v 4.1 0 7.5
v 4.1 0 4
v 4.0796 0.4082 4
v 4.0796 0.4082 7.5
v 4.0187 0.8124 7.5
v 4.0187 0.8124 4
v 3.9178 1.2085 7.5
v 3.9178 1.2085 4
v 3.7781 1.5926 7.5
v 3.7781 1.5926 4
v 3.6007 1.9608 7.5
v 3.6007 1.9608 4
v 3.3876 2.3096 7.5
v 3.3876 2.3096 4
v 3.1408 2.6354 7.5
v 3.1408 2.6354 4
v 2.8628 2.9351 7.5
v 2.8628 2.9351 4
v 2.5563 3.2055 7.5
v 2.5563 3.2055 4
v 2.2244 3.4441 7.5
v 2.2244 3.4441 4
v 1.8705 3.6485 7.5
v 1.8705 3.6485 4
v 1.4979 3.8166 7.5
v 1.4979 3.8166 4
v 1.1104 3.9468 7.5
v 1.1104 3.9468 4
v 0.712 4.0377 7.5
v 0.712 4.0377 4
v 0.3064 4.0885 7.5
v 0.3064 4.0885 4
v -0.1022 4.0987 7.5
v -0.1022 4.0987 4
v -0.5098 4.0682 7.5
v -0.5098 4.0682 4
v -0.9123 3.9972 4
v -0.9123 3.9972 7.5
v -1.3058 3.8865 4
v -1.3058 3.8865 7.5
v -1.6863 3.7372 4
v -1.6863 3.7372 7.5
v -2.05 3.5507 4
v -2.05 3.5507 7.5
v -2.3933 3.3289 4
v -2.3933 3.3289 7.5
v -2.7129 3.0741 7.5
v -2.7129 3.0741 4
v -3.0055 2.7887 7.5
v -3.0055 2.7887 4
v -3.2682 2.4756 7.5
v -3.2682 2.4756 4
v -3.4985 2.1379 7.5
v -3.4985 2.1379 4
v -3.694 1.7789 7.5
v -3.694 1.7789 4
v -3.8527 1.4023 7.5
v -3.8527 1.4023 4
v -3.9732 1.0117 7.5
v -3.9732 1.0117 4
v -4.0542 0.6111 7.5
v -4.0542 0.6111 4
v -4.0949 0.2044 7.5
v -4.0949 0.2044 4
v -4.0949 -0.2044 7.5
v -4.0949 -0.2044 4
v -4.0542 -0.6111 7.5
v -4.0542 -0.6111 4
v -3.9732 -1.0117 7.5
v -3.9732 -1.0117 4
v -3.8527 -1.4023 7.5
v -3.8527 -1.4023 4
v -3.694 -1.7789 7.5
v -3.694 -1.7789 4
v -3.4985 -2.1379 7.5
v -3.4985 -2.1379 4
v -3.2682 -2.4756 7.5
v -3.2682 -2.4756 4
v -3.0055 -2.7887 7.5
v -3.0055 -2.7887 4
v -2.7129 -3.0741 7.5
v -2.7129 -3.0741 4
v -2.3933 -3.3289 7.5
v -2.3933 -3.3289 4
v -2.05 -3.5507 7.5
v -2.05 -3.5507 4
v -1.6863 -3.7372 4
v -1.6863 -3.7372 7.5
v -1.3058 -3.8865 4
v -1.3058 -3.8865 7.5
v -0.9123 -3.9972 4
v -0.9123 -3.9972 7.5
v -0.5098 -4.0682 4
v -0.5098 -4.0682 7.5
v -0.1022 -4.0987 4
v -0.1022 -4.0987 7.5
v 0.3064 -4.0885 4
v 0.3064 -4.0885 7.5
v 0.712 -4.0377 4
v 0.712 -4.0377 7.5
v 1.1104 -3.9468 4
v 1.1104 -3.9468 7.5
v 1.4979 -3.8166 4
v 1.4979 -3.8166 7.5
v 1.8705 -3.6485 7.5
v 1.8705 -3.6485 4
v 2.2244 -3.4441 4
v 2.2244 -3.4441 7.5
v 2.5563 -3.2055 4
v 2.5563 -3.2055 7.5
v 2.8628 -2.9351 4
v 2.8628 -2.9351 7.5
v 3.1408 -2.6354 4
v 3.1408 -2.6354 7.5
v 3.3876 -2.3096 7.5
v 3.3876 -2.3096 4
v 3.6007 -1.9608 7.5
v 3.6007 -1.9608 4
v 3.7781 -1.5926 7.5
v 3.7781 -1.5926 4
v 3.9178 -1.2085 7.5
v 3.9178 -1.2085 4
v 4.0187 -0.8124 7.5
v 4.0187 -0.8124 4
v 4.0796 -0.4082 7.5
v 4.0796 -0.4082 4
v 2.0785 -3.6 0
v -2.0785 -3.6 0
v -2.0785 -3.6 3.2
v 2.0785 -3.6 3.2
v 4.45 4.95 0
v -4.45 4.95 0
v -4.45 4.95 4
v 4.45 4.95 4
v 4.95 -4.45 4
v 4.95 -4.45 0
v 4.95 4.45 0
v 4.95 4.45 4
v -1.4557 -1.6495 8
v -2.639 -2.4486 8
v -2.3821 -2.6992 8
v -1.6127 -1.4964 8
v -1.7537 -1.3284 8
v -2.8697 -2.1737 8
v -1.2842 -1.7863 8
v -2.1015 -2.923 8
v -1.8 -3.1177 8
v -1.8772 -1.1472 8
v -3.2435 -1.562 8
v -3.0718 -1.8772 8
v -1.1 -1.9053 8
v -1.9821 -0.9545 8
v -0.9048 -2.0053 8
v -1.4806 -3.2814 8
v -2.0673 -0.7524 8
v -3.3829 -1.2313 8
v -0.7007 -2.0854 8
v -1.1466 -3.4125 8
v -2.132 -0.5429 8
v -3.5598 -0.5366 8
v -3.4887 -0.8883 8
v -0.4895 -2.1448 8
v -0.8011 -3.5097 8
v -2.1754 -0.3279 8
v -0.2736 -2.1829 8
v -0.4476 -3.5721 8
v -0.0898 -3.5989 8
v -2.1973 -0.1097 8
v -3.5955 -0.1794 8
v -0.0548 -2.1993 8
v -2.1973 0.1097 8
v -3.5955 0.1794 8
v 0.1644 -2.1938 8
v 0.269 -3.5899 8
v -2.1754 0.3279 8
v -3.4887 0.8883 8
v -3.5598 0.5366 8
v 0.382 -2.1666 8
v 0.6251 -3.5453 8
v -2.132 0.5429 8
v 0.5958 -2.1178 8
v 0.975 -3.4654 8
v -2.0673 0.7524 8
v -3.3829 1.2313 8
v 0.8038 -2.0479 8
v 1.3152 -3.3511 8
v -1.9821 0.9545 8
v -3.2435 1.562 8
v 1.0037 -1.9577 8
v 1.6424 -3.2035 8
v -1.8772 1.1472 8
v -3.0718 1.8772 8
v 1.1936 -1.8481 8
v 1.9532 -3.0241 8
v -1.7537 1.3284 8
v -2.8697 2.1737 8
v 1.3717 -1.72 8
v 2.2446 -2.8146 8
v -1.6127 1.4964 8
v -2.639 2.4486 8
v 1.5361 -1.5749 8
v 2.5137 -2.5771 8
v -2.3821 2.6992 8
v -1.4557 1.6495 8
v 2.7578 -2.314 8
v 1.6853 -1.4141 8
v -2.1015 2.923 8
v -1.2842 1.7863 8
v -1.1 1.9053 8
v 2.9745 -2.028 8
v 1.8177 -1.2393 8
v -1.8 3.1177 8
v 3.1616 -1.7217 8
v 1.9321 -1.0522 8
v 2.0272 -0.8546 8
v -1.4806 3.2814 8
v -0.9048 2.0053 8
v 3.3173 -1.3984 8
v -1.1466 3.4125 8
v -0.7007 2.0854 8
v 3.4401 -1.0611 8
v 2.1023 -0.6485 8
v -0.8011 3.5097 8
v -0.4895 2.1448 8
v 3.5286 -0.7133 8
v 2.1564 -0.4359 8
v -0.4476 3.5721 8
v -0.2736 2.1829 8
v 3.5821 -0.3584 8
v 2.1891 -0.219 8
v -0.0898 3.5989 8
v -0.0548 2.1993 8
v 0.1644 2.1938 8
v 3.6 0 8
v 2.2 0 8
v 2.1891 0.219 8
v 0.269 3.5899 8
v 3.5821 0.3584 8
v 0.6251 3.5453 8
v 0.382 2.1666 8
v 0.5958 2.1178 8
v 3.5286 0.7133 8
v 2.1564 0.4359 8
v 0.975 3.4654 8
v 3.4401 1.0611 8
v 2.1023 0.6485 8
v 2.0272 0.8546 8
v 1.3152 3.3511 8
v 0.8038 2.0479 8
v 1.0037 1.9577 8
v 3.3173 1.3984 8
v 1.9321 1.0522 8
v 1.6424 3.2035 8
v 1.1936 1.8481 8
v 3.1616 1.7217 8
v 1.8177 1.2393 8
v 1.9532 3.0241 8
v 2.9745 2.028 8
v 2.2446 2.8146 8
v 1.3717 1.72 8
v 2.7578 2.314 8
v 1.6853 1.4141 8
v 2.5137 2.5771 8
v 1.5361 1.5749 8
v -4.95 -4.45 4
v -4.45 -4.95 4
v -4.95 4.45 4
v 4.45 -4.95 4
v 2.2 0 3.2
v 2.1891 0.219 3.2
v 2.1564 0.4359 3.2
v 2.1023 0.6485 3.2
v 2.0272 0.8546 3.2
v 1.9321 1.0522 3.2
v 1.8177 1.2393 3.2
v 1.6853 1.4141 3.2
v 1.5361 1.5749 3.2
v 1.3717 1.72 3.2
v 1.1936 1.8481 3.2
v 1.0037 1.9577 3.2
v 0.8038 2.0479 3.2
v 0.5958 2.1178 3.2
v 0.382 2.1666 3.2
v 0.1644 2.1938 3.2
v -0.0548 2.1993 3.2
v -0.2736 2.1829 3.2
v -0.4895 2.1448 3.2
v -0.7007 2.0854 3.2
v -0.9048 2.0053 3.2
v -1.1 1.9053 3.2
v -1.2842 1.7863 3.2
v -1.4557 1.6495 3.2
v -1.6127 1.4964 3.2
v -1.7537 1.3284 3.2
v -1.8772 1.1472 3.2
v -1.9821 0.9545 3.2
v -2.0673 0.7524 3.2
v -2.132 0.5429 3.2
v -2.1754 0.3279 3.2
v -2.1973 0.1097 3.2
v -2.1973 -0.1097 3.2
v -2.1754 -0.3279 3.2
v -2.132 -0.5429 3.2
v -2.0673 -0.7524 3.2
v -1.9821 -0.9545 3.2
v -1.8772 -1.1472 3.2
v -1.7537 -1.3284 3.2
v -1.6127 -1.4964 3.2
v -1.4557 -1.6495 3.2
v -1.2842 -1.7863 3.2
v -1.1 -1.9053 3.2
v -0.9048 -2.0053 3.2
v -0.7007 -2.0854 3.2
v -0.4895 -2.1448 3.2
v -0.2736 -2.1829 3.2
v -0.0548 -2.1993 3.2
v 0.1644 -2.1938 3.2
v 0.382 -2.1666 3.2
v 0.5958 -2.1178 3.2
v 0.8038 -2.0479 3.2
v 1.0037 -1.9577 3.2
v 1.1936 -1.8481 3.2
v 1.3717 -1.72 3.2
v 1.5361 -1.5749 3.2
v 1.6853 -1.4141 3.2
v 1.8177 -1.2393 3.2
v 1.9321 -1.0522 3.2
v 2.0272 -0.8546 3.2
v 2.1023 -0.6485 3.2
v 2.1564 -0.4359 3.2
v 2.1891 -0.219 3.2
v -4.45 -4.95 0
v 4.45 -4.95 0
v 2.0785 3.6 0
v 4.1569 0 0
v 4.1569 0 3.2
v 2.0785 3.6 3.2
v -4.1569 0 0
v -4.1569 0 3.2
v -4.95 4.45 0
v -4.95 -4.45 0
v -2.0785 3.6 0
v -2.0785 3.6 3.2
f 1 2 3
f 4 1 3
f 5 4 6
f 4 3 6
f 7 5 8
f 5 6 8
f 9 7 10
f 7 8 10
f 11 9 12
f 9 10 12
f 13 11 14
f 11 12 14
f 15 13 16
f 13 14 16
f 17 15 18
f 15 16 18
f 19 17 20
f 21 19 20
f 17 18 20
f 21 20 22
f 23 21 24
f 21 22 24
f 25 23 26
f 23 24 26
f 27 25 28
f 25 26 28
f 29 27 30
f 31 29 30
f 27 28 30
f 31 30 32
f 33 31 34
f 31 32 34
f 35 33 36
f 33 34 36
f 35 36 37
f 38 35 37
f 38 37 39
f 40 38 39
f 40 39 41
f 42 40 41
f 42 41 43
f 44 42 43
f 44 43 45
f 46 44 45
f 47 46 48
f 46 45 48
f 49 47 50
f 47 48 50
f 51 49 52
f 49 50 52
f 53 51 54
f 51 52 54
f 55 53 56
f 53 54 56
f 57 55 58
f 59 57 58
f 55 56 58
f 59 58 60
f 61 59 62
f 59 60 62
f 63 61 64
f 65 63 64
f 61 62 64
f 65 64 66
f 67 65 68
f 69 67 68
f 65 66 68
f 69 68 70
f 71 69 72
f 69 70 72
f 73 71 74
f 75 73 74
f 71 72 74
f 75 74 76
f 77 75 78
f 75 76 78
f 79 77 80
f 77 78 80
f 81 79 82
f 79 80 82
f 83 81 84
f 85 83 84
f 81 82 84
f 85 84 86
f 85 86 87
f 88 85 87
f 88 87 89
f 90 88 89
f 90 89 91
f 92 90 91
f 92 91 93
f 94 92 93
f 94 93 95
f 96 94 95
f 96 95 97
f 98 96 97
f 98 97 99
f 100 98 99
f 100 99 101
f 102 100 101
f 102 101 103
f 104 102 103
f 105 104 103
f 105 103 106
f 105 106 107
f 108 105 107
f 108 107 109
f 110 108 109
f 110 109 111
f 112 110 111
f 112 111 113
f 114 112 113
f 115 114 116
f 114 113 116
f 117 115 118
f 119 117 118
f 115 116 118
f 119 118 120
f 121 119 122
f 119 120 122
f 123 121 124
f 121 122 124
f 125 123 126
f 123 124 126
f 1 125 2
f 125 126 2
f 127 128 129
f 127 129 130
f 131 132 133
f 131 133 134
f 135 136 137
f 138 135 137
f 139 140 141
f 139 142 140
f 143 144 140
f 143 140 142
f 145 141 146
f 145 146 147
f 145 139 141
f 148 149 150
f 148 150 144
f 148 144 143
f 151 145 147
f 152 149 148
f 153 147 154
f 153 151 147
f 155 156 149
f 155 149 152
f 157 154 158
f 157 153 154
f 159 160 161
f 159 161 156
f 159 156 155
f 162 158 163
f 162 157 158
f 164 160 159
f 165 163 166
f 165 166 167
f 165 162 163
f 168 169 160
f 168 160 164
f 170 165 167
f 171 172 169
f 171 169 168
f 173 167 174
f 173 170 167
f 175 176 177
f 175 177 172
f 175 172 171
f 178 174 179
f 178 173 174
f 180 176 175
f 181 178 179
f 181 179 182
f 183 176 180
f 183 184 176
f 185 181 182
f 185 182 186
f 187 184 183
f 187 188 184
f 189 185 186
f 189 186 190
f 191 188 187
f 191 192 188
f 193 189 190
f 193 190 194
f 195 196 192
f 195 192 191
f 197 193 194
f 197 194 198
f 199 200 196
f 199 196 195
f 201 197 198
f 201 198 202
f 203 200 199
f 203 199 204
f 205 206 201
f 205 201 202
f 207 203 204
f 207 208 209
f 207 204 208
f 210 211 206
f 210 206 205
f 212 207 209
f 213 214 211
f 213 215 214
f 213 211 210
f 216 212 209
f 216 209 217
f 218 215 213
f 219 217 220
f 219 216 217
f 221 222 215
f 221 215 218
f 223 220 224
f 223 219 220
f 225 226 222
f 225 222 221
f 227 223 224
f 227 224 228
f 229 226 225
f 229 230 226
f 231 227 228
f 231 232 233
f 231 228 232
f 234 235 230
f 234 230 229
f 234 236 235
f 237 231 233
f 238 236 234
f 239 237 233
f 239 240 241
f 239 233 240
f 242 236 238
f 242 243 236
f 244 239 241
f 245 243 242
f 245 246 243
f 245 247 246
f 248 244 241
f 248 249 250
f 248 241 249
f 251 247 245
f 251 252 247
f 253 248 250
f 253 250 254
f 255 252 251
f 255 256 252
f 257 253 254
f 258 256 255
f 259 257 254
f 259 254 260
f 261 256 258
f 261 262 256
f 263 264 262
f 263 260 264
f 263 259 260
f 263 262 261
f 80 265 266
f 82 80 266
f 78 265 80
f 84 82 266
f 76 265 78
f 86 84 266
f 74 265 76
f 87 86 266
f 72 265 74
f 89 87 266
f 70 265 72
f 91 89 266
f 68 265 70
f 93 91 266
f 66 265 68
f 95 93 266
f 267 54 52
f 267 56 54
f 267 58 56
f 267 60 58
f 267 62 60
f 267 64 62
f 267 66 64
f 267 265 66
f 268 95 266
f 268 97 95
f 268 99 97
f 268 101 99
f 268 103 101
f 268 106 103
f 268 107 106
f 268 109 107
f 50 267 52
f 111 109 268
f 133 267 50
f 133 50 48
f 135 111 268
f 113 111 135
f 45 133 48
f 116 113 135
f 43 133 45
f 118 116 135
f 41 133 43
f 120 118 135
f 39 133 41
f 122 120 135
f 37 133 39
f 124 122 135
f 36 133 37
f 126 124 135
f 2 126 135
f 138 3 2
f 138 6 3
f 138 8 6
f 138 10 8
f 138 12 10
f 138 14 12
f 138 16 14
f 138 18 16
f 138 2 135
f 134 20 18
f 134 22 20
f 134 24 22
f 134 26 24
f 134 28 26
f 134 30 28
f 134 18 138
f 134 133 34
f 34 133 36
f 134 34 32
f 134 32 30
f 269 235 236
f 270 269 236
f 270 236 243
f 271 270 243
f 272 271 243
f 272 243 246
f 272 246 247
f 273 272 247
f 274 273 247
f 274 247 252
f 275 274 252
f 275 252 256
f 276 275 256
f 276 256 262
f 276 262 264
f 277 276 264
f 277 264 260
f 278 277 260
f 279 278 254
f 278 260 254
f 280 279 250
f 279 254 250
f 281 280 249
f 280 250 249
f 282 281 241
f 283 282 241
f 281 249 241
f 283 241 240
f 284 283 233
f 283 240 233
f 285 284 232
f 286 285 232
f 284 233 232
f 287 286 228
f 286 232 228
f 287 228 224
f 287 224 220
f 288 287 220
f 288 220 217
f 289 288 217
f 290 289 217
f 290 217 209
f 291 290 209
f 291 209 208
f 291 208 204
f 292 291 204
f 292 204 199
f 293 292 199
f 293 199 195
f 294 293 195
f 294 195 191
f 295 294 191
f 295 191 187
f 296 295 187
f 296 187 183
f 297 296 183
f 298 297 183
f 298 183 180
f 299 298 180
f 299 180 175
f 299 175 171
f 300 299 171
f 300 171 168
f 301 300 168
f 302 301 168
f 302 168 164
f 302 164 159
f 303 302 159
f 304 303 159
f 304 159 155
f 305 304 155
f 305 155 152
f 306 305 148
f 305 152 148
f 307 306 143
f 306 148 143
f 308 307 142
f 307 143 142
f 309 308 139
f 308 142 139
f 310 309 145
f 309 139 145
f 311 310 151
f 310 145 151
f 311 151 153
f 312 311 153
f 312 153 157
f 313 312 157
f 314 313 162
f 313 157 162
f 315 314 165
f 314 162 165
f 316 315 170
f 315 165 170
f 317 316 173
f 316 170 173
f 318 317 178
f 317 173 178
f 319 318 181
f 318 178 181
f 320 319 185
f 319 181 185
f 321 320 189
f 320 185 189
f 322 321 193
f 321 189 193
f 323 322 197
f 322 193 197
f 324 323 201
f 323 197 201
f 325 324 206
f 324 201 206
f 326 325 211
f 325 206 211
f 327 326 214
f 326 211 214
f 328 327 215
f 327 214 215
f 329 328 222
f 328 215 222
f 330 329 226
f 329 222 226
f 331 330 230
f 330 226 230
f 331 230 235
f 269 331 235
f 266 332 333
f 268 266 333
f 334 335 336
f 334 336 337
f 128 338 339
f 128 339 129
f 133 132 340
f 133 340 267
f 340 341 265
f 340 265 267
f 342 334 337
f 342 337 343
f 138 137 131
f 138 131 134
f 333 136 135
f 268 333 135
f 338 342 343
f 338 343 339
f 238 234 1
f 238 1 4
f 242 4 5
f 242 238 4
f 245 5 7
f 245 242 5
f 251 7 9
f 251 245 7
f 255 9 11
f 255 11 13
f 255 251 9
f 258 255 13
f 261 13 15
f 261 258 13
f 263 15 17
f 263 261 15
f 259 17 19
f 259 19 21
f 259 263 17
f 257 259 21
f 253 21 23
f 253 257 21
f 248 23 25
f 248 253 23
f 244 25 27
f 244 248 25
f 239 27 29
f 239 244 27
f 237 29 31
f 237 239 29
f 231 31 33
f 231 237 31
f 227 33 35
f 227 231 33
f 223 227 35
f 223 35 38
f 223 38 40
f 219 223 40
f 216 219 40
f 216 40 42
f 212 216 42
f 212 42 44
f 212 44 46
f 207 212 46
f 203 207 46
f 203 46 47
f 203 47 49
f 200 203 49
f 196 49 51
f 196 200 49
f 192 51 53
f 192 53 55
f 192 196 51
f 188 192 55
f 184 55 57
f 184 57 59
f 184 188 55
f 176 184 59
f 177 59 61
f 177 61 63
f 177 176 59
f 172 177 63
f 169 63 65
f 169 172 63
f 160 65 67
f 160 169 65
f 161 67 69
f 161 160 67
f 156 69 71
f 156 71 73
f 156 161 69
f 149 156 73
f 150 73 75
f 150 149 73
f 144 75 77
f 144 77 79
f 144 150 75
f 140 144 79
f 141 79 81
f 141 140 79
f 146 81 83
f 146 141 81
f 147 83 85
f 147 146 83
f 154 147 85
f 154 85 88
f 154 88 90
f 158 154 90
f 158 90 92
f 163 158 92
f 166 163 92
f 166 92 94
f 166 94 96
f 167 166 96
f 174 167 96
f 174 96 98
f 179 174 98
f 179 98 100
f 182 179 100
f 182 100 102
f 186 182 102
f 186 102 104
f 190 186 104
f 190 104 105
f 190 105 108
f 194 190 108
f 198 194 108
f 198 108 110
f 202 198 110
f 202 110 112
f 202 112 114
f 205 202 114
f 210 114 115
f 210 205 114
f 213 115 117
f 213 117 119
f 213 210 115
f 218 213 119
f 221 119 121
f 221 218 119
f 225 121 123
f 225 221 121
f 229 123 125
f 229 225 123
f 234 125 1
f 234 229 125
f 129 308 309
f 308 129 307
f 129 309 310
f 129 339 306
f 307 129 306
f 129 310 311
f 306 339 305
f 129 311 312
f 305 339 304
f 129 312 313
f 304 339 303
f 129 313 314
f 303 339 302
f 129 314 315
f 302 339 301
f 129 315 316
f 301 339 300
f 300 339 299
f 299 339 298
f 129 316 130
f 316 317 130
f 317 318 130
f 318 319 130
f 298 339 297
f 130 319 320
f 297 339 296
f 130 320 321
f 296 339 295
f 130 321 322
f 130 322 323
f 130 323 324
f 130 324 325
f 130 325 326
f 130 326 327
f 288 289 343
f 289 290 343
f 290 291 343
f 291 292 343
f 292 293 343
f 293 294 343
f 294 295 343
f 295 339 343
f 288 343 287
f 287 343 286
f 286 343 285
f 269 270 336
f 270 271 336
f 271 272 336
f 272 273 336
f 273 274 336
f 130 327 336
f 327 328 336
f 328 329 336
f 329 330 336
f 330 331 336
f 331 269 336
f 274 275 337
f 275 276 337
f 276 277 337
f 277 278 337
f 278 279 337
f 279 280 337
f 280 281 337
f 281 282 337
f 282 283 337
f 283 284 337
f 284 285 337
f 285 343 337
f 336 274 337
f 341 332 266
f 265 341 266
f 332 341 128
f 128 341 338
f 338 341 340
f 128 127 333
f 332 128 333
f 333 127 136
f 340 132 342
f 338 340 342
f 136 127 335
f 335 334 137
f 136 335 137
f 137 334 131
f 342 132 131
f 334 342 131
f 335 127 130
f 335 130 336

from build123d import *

# Parameters (mm, degrees)
ESQUISSE1_W             = 9.9
ESQUISSE1_H             = 9.9
BOSS_EXTRU_1_DEPTH      = 4
ENL_V_MAT_EXTRU_1_DEPTH = 3.2
ESQUISSE4_R             = 4.1
BOSS_EXTRU_2_DEPTH      = 4
CHANFREIN1_SIZE         = 0.5
ESQUISSE5_R             = 2.2
ENL_V_MAT_EXTRU_3_DEPTH = 11.63038099
CHANFREIN2_SIZE         = 0.5


with BuildPart() as part:
    # Esquisse1 → Boss.-Extru.1 (new body)
    with BuildSketch(Plane.XY):
        Rectangle(ESQUISSE1_W, ESQUISSE1_H)
    extrude(amount=BOSS_EXTRU_1_DEPTH)

    # Esquisse2 → Enlèv. mat.-Extru.1 (cut)
    with BuildSketch(Plane.XY):
        Polygon((4.156921938, 0), (2.078460969, 3.6), (-2.078460969, 3.6), (-4.156921938, 0), (-2.078460969, -3.6), (2.078460969, -3.6), align=None)
    extrude(amount=ENL_V_MAT_EXTRU_1_DEPTH, mode=Mode.SUBTRACT)

    # Esquisse4 → Boss.-Extru.2 (add)
    with BuildSketch(Plane.XY.offset(4)):
        Circle(ESQUISSE4_R)
    extrude(amount=BOSS_EXTRU_2_DEPTH)

    # Chanfrein1
    chanfrein1_edges = [part.edges().sort_by_distance(p)[0] for p in [
        (-4.1, 0, 8),
    ]]
    chamfer(chanfrein1_edges, length=CHANFREIN1_SIZE)

    # Esquisse5 → Enlèv. mat.-Extru.3 (cut, through all)
    with BuildSketch(Plane.XY.offset(8)):
        Circle(ESQUISSE5_R)
    extrude(amount=-ENL_V_MAT_EXTRU_3_DEPTH, mode=Mode.SUBTRACT)

    # Chanfrein2
    chanfrein2_edges = [part.edges().sort_by_distance(p)[0] for p in [
        (4.95, -4.95, 2),
        (-4.95, -4.95, 2),
        (-4.95, 4.95, 2),
        (4.95, 4.95, 2),
    ]]
    chamfer(chanfrein2_edges, length=CHANFREIN2_SIZE)


solid = part.part
